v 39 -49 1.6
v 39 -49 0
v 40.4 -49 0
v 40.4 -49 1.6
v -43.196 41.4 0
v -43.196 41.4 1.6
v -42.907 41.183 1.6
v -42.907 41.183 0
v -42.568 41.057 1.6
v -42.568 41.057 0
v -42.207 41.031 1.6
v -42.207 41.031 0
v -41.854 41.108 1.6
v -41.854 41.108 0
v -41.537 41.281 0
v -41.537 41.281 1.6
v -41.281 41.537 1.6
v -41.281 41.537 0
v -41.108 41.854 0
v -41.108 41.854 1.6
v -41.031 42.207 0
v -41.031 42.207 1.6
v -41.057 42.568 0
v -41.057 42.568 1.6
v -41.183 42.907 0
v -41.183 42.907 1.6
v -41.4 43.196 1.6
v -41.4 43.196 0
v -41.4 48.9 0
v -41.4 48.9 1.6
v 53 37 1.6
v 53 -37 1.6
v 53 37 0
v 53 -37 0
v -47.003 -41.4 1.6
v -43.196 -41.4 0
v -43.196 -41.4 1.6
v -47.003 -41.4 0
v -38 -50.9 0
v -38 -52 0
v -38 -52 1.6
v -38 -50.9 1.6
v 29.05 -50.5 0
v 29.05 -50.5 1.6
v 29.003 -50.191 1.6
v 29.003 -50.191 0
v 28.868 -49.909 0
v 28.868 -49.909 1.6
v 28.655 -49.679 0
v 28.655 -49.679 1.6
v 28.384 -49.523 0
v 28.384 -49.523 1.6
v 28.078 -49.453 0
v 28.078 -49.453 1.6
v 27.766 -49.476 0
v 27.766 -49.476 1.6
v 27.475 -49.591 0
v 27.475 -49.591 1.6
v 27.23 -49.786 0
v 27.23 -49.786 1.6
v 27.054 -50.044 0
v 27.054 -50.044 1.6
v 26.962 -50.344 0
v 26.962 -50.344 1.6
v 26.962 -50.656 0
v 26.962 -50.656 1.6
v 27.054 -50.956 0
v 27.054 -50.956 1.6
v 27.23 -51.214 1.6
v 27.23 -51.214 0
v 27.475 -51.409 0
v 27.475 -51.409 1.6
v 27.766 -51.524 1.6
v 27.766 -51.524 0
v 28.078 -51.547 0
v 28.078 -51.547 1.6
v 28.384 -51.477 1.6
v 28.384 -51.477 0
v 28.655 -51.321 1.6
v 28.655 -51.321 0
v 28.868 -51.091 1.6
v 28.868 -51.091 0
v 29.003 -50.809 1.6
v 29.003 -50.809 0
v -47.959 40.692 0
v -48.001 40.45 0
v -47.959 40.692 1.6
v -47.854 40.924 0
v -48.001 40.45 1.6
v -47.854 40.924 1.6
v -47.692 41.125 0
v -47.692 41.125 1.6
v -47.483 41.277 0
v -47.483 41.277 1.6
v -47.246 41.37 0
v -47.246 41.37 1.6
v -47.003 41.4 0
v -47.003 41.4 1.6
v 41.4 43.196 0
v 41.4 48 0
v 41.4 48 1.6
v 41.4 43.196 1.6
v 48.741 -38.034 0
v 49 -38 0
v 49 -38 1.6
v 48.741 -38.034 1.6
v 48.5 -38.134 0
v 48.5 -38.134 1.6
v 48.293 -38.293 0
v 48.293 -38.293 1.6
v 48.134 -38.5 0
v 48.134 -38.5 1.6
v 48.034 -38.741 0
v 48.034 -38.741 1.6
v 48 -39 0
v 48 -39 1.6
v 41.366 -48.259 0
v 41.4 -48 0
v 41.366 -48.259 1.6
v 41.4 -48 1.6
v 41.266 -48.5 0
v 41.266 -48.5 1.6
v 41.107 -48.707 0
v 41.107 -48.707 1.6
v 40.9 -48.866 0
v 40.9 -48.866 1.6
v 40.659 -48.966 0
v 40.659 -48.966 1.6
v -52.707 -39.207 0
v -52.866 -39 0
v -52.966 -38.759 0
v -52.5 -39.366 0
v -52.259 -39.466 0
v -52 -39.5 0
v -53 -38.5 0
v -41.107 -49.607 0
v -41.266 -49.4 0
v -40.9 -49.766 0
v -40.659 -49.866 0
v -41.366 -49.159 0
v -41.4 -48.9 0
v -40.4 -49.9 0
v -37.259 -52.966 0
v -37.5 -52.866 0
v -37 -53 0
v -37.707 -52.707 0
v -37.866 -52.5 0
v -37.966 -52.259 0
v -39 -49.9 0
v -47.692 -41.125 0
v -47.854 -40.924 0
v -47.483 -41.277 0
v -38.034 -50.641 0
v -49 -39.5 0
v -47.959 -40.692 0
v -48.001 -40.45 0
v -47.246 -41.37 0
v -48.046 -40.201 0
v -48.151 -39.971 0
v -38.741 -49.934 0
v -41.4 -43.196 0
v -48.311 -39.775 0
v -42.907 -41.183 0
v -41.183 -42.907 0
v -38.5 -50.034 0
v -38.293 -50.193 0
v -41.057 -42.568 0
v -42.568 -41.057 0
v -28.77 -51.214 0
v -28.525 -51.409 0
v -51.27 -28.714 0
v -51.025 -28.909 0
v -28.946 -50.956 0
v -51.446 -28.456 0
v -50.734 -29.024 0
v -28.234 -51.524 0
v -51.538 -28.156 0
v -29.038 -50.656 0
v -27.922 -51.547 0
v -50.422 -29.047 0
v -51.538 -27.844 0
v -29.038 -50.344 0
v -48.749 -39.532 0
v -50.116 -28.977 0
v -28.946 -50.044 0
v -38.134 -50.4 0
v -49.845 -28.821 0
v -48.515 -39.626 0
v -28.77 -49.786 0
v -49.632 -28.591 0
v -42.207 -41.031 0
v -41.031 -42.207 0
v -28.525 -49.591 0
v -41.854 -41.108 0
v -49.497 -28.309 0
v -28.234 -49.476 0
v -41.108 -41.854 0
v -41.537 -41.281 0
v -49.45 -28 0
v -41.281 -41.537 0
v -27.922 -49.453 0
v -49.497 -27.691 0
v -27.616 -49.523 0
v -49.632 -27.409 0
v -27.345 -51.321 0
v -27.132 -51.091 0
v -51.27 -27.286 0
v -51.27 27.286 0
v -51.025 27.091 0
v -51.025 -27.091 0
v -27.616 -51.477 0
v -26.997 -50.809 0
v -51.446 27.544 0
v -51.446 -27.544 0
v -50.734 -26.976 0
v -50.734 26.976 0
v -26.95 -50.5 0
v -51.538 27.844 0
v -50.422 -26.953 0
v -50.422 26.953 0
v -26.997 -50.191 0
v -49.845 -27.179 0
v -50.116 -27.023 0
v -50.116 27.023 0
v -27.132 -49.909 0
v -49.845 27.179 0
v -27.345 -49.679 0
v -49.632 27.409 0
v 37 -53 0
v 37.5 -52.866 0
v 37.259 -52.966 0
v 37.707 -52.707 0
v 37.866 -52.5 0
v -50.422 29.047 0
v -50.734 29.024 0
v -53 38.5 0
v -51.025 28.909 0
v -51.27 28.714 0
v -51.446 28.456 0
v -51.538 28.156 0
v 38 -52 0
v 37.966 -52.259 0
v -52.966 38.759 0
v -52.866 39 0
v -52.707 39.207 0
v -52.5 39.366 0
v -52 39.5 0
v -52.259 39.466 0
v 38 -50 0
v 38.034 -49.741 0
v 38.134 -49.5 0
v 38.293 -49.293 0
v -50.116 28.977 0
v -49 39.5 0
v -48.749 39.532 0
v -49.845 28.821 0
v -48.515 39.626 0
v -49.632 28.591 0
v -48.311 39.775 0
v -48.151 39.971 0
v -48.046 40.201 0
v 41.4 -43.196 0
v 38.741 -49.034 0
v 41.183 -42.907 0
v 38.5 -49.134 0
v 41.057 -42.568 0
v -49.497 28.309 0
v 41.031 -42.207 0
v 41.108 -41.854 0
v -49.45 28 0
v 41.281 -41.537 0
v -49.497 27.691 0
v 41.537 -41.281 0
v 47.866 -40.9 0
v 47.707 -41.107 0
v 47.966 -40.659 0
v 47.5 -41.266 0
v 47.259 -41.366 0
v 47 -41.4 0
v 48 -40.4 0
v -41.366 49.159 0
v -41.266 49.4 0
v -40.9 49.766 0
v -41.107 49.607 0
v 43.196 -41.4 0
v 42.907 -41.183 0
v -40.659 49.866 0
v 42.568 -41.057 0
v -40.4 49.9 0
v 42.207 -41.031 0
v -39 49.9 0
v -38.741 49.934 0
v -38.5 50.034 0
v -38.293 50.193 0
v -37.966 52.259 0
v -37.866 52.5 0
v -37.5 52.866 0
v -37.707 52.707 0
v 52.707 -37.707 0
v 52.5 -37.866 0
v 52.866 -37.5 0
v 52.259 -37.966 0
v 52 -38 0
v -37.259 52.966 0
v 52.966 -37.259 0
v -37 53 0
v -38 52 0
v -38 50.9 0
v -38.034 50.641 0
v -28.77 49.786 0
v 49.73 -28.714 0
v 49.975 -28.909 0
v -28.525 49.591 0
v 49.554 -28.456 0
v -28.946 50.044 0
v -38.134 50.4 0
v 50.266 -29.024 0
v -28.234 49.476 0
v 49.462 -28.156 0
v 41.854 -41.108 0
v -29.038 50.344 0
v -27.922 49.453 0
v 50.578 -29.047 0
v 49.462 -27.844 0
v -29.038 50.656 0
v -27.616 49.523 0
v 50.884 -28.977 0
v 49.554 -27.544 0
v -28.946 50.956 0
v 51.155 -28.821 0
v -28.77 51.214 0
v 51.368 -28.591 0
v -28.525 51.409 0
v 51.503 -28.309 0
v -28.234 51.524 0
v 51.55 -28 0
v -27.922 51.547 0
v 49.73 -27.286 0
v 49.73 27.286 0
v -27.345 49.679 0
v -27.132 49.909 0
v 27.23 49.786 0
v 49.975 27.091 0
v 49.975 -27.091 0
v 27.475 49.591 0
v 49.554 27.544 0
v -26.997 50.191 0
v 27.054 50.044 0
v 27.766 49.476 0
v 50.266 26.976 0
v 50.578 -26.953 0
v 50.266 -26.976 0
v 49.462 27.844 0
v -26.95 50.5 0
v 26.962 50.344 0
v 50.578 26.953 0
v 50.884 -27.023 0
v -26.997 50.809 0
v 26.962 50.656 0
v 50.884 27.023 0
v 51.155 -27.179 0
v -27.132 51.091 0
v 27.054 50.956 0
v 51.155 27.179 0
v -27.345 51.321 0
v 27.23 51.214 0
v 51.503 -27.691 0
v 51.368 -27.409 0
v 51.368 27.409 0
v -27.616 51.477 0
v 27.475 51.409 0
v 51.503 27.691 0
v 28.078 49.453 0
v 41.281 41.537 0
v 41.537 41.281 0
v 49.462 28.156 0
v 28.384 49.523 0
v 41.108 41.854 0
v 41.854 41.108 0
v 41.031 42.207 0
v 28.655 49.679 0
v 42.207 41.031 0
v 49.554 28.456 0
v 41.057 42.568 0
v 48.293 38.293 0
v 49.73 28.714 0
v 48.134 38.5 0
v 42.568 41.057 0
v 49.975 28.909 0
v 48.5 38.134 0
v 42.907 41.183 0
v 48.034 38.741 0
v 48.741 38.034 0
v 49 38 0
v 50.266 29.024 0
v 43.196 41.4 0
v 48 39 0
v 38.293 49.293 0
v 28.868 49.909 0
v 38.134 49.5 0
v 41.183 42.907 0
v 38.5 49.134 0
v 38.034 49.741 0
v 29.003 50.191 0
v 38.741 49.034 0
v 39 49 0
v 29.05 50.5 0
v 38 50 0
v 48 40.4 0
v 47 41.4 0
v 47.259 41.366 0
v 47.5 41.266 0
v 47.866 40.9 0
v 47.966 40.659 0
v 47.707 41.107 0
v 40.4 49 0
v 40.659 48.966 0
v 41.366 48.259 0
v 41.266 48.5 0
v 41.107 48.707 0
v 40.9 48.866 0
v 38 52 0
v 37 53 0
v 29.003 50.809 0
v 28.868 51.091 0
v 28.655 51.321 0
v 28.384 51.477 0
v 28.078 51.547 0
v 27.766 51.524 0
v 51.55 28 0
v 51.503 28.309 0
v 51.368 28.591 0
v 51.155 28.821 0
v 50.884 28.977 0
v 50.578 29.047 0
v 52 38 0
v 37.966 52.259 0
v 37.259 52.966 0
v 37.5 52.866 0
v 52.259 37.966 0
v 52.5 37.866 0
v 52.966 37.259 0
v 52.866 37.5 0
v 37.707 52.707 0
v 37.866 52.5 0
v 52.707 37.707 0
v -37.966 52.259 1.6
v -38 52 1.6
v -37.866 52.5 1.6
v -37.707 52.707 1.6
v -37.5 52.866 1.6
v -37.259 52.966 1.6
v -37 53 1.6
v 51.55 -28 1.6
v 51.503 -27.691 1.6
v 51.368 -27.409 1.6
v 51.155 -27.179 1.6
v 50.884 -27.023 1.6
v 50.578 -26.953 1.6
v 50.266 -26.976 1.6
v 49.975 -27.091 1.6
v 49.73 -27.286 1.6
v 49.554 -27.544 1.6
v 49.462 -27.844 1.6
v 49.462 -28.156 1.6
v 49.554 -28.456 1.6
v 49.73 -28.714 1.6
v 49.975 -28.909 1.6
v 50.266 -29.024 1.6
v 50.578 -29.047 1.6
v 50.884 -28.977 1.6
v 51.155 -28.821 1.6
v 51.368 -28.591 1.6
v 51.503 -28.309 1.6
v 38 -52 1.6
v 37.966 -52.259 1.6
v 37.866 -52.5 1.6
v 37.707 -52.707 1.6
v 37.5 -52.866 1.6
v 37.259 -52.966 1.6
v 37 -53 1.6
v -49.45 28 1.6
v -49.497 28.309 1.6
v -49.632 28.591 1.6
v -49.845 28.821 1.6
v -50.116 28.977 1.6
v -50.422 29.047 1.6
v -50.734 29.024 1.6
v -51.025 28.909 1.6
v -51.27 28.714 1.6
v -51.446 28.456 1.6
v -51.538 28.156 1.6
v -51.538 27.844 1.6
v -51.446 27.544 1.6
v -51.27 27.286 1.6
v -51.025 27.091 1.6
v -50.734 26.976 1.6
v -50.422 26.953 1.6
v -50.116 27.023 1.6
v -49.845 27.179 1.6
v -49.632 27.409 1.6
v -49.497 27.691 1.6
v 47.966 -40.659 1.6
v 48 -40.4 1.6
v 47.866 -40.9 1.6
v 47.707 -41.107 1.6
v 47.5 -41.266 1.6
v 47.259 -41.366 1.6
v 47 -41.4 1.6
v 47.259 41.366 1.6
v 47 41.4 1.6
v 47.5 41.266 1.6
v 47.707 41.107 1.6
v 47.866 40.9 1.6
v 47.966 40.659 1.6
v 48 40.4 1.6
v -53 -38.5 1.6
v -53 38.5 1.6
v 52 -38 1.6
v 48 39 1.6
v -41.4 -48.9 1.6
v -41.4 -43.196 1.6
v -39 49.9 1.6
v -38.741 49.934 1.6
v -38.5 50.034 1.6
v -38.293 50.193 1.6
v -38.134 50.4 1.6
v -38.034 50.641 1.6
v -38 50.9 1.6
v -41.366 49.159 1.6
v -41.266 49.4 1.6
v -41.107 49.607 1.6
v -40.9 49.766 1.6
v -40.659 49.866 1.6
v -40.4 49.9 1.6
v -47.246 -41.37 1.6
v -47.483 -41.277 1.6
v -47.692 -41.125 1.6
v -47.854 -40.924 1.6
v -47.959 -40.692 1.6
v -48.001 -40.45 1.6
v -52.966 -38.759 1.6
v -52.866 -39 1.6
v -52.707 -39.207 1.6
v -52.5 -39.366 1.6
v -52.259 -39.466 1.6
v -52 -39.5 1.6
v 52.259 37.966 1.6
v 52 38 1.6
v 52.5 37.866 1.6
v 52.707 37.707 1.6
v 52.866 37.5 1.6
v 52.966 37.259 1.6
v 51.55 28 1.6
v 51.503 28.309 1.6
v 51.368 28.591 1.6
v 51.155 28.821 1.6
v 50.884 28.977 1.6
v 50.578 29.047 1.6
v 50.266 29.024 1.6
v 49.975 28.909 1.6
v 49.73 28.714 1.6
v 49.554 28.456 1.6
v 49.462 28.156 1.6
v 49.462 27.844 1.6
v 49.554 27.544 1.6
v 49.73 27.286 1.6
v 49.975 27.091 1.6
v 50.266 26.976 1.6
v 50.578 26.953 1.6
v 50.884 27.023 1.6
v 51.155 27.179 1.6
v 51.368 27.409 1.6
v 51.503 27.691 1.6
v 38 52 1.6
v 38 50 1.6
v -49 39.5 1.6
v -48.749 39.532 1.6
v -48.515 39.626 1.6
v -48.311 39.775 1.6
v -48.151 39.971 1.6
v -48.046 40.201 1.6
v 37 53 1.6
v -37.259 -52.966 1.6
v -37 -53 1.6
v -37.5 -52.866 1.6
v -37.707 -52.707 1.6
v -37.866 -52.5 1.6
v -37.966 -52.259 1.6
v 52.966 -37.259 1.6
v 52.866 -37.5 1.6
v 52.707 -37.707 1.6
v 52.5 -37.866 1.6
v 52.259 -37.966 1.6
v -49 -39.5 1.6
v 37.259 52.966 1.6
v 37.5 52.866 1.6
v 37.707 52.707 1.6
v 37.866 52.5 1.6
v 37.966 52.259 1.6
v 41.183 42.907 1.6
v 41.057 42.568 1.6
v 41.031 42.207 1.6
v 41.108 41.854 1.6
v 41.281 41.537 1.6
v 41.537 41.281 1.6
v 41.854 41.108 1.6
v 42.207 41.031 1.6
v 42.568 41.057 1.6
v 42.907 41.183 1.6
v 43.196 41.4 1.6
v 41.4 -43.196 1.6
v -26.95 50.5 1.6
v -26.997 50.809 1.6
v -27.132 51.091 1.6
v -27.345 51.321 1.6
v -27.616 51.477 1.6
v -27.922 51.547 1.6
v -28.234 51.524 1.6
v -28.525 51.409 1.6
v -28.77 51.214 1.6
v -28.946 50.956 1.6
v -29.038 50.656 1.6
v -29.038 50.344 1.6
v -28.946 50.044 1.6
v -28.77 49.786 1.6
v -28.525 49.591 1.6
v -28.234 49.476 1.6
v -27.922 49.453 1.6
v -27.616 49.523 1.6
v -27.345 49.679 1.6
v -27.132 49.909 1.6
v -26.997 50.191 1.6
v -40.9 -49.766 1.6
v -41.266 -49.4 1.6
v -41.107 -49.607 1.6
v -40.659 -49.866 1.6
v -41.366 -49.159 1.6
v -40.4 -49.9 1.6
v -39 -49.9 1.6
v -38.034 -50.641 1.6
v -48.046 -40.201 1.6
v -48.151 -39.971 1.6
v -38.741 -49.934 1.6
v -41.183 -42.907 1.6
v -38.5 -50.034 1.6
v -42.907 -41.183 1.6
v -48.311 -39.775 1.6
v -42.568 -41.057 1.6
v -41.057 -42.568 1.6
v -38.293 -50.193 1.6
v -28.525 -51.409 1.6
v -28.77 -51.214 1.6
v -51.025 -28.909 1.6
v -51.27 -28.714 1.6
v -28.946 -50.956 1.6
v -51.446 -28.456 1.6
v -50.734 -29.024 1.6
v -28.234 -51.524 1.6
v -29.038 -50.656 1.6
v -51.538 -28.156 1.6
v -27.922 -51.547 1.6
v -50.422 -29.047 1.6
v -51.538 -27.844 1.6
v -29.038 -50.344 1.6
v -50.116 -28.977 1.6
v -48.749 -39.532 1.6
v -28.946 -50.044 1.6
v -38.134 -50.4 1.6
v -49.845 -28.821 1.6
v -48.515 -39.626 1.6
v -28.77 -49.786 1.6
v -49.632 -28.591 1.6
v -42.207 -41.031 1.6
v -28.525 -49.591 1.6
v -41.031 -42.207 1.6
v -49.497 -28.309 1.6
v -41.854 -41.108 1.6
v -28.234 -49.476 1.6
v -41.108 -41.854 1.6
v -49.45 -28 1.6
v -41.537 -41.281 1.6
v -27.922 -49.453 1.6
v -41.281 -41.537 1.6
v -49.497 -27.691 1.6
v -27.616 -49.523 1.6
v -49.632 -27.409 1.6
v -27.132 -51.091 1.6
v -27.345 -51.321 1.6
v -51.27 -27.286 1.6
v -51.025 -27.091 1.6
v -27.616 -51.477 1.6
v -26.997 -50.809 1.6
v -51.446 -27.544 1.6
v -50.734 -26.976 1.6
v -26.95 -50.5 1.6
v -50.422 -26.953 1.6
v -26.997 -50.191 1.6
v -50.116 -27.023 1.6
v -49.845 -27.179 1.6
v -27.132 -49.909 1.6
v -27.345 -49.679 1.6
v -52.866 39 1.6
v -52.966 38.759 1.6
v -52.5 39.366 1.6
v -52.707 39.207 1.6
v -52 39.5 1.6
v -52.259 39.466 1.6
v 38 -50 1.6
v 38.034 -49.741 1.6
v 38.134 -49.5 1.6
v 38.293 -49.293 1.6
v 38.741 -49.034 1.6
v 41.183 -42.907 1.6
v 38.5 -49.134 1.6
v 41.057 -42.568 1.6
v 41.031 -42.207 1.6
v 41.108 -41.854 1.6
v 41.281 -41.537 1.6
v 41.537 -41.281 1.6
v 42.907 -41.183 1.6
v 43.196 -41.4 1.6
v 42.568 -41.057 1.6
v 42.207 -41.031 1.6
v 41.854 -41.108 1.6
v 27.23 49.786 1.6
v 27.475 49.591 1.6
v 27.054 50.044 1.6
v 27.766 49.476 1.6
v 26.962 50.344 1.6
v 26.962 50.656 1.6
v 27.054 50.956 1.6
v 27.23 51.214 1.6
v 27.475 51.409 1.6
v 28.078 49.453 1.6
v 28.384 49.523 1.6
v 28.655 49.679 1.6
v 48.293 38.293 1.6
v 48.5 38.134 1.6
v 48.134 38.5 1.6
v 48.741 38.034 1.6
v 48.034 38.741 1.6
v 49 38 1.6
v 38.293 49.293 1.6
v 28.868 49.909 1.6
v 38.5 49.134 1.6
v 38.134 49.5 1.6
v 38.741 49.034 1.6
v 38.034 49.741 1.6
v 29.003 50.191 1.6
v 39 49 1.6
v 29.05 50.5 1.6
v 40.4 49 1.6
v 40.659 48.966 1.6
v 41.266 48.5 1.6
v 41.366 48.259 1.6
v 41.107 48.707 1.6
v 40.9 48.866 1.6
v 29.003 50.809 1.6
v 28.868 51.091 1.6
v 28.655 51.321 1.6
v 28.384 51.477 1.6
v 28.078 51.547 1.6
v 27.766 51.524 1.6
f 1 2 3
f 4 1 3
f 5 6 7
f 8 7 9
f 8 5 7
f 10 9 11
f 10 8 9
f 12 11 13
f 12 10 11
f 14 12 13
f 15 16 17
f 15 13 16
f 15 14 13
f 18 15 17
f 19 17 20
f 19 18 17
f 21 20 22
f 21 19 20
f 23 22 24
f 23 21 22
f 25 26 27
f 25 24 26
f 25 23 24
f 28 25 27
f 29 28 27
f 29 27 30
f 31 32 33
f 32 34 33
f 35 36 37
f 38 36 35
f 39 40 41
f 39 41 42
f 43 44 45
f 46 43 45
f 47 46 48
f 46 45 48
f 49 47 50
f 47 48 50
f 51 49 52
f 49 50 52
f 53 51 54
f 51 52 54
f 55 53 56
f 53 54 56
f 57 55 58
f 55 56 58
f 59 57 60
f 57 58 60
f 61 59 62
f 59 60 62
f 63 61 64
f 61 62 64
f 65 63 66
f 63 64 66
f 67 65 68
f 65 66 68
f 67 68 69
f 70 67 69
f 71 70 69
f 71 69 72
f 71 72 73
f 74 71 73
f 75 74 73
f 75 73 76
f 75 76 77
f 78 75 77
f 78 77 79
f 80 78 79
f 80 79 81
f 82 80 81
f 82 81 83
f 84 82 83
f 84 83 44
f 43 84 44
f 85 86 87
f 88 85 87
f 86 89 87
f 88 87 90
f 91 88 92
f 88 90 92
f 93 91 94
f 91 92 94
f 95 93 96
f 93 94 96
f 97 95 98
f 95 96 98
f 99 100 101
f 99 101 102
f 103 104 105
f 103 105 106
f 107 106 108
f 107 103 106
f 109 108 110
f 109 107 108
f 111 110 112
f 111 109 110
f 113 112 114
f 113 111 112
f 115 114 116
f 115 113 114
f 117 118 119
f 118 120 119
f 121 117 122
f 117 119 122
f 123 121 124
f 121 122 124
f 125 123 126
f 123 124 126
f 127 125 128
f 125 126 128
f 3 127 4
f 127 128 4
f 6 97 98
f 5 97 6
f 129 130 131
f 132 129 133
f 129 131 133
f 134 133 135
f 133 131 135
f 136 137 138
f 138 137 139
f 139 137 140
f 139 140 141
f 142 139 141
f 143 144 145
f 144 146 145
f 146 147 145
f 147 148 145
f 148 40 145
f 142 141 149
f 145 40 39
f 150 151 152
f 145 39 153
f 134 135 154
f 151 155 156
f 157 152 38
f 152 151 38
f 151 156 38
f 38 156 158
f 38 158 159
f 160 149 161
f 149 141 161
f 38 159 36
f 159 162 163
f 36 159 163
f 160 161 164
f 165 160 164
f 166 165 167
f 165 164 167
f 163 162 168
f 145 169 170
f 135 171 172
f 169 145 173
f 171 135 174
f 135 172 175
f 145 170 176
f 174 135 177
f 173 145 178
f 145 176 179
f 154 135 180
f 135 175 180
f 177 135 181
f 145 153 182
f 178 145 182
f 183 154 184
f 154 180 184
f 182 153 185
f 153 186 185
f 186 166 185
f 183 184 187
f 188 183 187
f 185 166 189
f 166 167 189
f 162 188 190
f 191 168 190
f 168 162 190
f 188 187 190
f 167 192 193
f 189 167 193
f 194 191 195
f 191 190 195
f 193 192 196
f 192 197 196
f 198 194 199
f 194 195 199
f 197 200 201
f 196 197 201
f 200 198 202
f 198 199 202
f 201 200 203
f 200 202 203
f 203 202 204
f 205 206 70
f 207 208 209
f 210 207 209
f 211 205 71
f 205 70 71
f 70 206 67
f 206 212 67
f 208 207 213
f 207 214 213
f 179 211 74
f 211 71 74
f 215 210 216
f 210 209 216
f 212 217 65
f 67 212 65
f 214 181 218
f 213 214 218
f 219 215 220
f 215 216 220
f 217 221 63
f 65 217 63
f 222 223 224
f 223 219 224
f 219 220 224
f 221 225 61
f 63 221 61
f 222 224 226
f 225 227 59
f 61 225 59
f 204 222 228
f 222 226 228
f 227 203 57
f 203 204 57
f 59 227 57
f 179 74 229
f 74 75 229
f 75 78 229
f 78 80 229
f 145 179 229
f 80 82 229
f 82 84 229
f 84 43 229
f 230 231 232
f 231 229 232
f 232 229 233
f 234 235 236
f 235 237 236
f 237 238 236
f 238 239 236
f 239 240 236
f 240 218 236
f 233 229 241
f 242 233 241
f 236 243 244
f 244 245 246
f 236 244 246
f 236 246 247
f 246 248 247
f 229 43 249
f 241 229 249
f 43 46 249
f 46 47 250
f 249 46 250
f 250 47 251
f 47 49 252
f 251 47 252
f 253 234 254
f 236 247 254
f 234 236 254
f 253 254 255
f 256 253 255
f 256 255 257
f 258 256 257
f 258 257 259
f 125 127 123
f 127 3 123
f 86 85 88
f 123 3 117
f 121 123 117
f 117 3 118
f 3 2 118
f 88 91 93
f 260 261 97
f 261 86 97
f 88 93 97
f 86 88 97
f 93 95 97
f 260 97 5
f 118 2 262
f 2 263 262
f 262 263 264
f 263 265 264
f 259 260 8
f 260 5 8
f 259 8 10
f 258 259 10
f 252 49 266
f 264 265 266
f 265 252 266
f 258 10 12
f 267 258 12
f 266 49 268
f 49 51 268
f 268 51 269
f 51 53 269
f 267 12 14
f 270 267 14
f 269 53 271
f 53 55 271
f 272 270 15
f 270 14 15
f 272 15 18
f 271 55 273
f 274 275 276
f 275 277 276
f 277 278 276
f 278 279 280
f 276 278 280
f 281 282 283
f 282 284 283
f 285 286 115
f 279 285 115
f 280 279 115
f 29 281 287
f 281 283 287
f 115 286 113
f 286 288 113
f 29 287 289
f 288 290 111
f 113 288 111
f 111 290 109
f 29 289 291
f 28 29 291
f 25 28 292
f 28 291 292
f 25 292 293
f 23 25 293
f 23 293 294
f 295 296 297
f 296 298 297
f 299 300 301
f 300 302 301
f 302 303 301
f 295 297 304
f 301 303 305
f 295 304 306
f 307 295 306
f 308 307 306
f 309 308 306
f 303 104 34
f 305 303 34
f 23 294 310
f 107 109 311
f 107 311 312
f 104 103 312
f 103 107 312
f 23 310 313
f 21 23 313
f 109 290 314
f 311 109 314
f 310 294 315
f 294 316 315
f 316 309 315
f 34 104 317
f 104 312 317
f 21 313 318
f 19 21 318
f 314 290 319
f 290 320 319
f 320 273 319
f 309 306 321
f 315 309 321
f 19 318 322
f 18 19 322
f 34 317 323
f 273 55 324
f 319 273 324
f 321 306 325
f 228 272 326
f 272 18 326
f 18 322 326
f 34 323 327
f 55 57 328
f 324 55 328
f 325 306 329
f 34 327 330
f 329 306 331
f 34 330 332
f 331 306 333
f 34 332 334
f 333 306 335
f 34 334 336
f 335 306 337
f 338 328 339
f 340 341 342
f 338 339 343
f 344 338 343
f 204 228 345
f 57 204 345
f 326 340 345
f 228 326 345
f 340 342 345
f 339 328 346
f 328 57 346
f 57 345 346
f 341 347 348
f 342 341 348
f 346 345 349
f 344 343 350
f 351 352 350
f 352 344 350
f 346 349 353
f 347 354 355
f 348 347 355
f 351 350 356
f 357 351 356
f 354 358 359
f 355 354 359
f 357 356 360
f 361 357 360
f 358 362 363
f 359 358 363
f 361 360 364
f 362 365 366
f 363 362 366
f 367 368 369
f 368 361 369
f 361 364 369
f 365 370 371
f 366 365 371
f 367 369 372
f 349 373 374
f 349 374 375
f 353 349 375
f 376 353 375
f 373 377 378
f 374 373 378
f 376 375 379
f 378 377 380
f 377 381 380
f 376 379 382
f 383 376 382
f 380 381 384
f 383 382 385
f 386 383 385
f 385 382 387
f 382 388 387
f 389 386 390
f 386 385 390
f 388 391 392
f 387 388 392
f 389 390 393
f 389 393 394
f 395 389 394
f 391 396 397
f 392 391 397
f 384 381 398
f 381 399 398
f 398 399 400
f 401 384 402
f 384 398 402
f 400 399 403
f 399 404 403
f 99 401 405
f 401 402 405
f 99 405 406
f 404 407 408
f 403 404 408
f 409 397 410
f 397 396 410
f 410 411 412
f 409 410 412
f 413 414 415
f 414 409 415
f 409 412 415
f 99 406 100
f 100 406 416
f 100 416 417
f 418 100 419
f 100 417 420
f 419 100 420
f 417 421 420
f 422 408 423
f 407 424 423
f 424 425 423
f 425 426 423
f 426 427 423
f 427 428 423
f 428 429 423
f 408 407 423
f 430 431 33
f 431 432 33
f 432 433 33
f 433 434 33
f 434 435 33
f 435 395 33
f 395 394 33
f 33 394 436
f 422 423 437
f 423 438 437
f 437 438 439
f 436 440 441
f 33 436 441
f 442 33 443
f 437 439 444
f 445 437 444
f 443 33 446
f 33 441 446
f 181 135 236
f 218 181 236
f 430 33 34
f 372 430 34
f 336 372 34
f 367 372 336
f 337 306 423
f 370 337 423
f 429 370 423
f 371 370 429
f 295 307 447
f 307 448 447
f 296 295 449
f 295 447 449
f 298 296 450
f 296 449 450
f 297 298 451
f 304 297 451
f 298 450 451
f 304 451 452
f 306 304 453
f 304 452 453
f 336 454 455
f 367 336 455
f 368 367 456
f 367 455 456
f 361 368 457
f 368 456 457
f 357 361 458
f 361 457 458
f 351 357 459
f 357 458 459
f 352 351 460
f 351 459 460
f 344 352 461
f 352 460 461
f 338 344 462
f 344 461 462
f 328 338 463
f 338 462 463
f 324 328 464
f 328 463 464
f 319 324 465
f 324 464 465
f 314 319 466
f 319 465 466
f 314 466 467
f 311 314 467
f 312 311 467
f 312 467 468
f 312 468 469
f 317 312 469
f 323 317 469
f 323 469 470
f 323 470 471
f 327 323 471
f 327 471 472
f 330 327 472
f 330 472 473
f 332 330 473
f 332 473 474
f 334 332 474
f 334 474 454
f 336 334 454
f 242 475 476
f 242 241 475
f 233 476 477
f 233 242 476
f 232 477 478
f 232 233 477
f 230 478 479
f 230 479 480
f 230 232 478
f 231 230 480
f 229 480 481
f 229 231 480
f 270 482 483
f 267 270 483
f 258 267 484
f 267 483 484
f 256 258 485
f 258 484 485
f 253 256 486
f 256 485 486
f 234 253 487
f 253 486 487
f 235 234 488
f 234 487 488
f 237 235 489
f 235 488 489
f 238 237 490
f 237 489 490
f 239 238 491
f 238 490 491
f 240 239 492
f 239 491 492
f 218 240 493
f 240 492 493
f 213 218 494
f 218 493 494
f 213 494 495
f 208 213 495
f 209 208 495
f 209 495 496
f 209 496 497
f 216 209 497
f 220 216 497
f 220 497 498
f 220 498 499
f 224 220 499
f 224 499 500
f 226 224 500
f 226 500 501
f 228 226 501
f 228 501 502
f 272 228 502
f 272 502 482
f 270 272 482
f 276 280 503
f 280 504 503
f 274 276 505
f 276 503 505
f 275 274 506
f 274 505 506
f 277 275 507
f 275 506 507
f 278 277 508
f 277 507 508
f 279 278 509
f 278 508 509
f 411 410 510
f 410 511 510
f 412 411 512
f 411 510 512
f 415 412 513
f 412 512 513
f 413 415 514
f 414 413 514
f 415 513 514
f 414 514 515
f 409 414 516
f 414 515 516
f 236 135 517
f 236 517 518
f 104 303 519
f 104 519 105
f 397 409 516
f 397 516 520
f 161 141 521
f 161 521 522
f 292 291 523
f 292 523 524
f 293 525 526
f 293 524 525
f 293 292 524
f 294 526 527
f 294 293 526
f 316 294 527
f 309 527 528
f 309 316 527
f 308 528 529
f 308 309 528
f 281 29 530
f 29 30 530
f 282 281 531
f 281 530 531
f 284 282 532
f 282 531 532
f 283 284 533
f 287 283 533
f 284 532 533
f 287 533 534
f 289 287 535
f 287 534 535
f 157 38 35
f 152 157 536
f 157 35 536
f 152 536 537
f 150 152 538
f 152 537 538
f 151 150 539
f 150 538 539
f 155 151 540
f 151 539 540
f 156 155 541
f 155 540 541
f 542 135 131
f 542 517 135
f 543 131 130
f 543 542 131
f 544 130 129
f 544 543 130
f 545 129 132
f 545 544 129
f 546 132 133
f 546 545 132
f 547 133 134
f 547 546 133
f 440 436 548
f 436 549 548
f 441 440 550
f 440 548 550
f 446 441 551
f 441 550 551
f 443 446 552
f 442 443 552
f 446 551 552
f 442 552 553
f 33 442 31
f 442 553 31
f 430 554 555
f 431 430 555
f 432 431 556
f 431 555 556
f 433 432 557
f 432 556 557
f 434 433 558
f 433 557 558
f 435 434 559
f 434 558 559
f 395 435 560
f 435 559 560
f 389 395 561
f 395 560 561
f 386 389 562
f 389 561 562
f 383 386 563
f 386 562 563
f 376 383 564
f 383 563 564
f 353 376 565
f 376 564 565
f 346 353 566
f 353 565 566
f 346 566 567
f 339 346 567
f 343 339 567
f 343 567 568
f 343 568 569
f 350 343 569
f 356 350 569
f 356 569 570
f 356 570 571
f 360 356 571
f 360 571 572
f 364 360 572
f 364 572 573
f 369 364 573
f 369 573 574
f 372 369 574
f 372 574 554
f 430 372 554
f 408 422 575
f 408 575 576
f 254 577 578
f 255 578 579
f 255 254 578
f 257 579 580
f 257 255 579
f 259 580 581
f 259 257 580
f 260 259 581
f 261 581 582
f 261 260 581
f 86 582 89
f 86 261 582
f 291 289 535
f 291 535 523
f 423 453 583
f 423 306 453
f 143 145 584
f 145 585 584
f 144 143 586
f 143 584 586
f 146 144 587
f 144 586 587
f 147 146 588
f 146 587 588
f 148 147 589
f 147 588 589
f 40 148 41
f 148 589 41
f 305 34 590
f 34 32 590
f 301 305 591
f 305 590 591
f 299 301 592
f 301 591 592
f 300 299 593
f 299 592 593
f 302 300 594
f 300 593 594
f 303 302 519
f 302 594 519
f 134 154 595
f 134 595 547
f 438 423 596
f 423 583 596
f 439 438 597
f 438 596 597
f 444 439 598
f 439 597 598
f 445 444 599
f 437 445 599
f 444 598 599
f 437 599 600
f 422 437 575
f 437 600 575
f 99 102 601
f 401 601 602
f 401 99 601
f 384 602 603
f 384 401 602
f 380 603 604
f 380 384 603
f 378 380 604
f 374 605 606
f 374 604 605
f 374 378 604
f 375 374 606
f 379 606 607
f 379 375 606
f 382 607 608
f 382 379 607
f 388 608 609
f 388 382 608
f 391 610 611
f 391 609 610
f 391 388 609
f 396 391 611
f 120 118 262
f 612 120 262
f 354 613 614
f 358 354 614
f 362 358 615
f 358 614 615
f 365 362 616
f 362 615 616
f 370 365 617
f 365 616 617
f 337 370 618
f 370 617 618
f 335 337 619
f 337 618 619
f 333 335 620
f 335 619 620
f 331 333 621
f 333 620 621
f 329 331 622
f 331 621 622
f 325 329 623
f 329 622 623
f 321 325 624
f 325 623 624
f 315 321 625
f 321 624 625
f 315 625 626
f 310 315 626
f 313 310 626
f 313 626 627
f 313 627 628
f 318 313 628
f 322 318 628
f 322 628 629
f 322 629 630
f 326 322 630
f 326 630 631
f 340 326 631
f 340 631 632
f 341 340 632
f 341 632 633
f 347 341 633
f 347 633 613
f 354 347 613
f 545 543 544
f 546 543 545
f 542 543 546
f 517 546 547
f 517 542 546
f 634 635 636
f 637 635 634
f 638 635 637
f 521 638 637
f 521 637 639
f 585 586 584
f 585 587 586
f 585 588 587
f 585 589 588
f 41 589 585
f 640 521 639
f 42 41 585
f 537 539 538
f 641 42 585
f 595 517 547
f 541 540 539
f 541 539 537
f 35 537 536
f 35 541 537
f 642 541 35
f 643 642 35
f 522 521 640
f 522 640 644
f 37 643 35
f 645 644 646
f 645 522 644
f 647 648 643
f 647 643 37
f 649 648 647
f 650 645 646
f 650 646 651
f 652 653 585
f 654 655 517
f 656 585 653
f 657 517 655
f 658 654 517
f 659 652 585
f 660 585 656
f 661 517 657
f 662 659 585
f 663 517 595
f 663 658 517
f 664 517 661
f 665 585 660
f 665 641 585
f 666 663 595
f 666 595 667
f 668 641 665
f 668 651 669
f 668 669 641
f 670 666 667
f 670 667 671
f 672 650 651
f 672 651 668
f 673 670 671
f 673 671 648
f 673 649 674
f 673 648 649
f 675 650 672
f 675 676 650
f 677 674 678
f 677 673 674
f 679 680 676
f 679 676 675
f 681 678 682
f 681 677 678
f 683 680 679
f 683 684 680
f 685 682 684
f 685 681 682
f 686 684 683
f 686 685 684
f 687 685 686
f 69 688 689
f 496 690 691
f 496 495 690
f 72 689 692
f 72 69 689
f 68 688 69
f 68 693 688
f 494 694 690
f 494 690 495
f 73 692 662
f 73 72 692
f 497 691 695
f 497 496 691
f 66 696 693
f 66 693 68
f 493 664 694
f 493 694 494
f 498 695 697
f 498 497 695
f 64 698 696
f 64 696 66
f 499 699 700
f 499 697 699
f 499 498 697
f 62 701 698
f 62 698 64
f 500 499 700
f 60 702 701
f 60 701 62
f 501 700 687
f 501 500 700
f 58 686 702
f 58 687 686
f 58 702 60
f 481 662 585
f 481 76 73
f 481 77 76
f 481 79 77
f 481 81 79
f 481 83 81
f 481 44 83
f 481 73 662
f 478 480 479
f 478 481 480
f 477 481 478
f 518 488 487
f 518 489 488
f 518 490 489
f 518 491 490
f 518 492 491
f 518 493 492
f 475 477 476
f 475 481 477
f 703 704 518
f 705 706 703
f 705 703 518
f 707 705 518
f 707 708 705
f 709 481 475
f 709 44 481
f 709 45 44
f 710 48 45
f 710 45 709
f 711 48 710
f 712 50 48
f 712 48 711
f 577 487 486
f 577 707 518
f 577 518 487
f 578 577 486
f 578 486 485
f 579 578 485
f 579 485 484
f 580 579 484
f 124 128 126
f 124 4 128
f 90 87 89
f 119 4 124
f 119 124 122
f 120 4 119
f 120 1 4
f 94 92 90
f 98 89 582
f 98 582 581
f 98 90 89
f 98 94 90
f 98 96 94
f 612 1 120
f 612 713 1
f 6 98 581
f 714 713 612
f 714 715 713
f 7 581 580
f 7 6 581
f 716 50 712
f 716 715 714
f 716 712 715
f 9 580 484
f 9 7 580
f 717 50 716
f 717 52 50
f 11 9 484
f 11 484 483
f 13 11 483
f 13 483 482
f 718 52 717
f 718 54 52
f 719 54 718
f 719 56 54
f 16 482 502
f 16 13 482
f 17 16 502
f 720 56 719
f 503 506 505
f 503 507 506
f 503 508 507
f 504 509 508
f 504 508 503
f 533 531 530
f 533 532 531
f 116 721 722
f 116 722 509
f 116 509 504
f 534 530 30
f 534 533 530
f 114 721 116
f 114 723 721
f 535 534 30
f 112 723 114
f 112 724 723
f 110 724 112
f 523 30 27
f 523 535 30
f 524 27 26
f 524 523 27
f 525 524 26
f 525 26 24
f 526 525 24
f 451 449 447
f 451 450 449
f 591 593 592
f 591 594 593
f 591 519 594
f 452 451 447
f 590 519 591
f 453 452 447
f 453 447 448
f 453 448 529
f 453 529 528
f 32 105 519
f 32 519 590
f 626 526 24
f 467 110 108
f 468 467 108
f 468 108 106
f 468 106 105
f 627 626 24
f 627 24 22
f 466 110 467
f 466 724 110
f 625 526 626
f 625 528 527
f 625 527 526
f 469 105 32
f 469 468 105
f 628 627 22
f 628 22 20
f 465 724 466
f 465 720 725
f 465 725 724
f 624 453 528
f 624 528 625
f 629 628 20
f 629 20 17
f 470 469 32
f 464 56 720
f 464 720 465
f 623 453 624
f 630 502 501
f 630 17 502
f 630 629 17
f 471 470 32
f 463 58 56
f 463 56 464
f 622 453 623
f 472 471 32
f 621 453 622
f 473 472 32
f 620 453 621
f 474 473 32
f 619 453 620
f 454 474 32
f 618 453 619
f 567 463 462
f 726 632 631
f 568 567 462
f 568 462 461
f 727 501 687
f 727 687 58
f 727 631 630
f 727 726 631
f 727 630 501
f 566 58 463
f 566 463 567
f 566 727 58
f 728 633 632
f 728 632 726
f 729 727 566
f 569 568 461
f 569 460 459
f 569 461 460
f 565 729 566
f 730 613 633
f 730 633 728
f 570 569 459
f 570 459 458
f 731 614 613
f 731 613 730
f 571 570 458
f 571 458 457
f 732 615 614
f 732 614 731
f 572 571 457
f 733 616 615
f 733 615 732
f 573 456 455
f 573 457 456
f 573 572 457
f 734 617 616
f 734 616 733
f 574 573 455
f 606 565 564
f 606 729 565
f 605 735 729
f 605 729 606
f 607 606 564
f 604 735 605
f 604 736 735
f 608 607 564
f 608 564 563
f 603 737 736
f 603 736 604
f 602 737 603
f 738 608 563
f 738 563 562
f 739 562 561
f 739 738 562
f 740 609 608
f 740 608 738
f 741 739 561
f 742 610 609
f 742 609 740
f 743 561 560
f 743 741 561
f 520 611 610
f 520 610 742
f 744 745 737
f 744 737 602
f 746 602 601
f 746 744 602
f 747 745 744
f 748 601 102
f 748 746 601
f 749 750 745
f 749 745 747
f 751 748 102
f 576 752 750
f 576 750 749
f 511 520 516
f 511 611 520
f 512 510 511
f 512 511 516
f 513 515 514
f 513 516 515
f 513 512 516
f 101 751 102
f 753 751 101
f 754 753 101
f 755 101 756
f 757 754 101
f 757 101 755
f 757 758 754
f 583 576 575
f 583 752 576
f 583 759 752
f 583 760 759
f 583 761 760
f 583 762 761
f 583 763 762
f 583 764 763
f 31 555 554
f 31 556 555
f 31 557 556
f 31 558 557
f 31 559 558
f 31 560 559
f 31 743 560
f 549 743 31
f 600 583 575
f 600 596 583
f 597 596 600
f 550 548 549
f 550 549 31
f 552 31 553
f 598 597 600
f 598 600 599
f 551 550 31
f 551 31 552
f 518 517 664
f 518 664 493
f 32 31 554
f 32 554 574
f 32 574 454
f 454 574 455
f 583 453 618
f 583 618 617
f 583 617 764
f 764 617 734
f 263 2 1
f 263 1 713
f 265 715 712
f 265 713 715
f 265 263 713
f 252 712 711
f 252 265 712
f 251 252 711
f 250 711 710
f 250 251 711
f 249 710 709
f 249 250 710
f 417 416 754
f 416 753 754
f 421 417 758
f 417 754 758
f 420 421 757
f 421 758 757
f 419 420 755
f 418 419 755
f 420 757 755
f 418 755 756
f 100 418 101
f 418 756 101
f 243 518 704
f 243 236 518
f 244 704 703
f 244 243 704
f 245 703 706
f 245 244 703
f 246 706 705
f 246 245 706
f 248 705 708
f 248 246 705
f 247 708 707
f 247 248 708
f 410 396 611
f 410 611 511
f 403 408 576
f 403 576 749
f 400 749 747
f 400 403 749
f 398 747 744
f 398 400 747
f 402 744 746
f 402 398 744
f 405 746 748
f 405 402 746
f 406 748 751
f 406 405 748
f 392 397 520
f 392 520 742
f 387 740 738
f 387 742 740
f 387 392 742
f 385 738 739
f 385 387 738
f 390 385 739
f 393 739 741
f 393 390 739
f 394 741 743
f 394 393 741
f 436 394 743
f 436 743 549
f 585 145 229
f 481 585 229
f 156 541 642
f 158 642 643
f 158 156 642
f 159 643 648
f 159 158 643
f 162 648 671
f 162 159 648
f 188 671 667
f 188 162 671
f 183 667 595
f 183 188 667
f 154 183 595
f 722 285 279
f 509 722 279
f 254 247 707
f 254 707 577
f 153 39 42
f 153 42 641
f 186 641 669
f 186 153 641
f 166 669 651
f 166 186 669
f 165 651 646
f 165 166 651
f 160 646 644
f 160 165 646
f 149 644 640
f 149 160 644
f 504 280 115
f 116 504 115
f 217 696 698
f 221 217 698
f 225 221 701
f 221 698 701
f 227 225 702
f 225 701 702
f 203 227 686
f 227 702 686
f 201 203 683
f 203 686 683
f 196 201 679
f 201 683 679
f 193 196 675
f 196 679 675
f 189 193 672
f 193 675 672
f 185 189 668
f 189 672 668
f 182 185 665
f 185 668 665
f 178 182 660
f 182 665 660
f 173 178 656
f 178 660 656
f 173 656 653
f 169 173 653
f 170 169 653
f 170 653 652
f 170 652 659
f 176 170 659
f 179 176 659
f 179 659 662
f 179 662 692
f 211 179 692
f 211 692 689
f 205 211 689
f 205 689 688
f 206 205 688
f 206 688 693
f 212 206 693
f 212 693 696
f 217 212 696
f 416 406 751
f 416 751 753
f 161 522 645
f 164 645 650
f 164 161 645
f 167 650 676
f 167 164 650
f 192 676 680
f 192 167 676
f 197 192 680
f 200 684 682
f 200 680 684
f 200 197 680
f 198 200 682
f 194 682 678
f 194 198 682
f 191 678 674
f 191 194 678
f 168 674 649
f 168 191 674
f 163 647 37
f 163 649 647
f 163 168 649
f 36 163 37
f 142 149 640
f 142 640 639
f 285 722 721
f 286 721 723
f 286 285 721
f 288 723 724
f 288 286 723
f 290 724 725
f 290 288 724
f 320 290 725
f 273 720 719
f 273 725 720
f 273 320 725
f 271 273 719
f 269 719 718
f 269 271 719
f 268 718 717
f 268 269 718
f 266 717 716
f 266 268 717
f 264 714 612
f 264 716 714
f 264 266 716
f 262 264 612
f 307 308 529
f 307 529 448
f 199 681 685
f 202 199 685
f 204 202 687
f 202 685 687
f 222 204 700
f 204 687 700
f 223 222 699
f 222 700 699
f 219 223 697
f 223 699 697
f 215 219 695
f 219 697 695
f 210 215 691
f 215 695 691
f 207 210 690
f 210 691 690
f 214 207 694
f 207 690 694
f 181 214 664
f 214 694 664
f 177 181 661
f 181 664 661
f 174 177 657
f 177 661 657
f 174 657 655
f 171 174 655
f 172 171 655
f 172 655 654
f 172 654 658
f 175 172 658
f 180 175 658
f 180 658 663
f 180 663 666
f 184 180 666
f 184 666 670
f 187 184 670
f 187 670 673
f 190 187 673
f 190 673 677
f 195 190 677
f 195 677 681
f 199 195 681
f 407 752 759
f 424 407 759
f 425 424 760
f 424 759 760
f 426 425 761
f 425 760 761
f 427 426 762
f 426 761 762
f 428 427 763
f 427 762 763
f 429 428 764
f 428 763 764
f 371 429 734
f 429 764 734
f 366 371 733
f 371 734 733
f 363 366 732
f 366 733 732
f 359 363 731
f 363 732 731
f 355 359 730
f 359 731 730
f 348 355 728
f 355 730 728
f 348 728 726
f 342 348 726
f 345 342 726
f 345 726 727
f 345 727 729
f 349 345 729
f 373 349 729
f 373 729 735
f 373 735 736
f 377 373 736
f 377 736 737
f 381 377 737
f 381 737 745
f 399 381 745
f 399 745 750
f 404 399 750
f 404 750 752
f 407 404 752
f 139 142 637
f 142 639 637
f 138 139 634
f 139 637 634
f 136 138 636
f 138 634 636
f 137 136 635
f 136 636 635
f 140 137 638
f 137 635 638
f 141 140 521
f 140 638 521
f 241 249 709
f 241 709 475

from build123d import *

# Parameters (mm, degrees)
SKETCH1_W            = 106
SKETCH1_H            = 106
MAINOUTLINE_DEPTH    = 1.6
RAILCUTOUTS_DEPTH    = 75.970394157
DOGBONES_DEPTH       = 75.970394157
SOLARFILLETS_DEPTH   = 75.970394157
HANDLINGFILLETS_R    = 1
M2_CLEARANCE_HOLE1_D = 2.1


with BuildPart() as part:
    # Sketch1 → mainOutline (new body)
    with BuildSketch(Plane.XY):
        Rectangle(SKETCH1_W, SKETCH1_H)
    extrude(amount=MAINOUTLINE_DEPTH)

    # Sketch4 → railCutouts (cut, through all)
    with BuildSketch(Plane(origin=(0, 0, 0), x_dir=(-1, 0, 0), z_dir=(0, 0, -1))):
        Polygon((-41.4, -41.4), (-48, -41.4), (-48, -39), (-49.9975, -39), (-60.106513243, -39), (-60.106513243, -61.452099286), (-39, -61.452099286), (-39, -49.9), (-39, -49), (-41.4, -49), align=None)
        Polygon((39, -56.27525328), (39, -49.9), (41.4, -49.9), (41.4, -41.4), (48, -41.4), (48, -40.5), (55.517672261, -40.5), (55.517672261, -56.27525328), align=None)
        Polygon((55.383846757, 40.5), (48, 40.5), (48, 41.4), (41.4, 41.4), (41.4, 49.9), (39, 49.9), (39, 57.687687567), (55.383846757, 57.687687567), align=None)
        Polygon((-39, 59.880423019), (-39, 49.9), (-39, 49), (-41.4, 49), (-41.4, 41.4), (-48, 41.4), (-48, 39), (-49.9975, 39), (-56.842822937, 39), (-56.842822937, 59.880423019), align=None)
    extrude(amount=-RAILCUTOUTS_DEPTH, mode=Mode.SUBTRACT)

    # Sketch5 → dogbones (cut, through all)
    with BuildSketch(Plane(origin=(0, 0, 0), x_dir=(-1, 0, 0), z_dir=(0, 0, -1))):
        with BuildLine():
            Line((-41.4, -43.196051224), (-44.546497129, -46.342548353))
            ThreePointArc((-44.546497129, -46.342548353), (-46.342548353, -46.342548353), (-46.342548353, -44.546497129))
            Line((-46.342548353, -44.546497129), (-43.196051224, -41.4))
            ThreePointArc((-43.196051224, -41.4), (-41.4, -41.4), (-41.4, -43.196051224))
        make_face()
        with BuildLine():
            Line((43.196051224, -41.4), (44.93821772, -43.142166495))
            ThreePointArc((44.93821772, -43.142166495), (44.93821772, -44.93821772), (43.142166495, -44.93821772))
            Line((43.142166495, -44.93821772), (41.4, -43.196051224))
            ThreePointArc((41.4, -43.196051224), (41.4, -41.4), (43.196051224, -41.4))
        make_face()
        with BuildLine():
            Line((41.4, 43.196051224), (43.13099025, 44.927041474))
            ThreePointArc((43.13099025, 44.927041474), (44.927041474, 44.927041474), (44.927041474, 43.13099025))
            Line((44.927041474, 43.13099025), (43.196051224, 41.4))
            ThreePointArc((43.196051224, 41.4), (41.4, 41.4), (41.4, 43.196051224))
        make_face()
        with BuildLine():
            Line((-43.196051224, 41.4), (-44.694846249, 42.898795025))
            ThreePointArc((-44.694846249, 42.898795025), (-44.694846249, 44.694846249), (-42.898795025, 44.694846249))
            Line((-42.898795025, 44.694846249), (-41.4, 43.196051224))
            ThreePointArc((-41.4, 43.196051224), (-41.4, 41.4), (-43.196051224, 41.4))
        make_face()
    extrude(amount=-DOGBONES_DEPTH, mode=Mode.SUBTRACT)

    # Sketch6 → solarFillets (cut, through all)
    with BuildSketch(Plane(origin=(0, 0, 0), x_dir=(-1, 0, 0), z_dir=(0, 0, -1))):
        with BuildLine():
            Line((-40, 50), (-40, 53))
            ThreePointArc((-40, 53), (-39, 54), (-38, 53))
            Line((-38, 53), (-38, 50))
            ThreePointArc((-38, 50), (-39, 49), (-40, 50))
        make_face()
        with BuildLine():
            Line((-49, 38), (-53, 38))
            ThreePointArc((-53, 38), (-54, 39), (-53, 40))
            Line((-53, 40), (-49, 40))
            ThreePointArc((-49, 40), (-48, 39), (-49, 38))
        make_face()
        with BuildLine():
            Line((-49, -40), (-55.214202913, -40))
            ThreePointArc((-55.214202913, -40), (-56.214202913, -39), (-55.214202913, -38))
            Line((-55.214202913, -38), (-49, -38))
            ThreePointArc((-49, -38), (-48, -39), (-49, -40))
        make_face()
        with BuildLine():
            Line((-38, -50), (-38, -53.916094318))
            ThreePointArc((-38, -53.916094318), (-39, -54.916094318), (-40, -53.916094318))
            Line((-40, -53.916094318), (-40, -50))
            ThreePointArc((-40, -50), (-39, -49), (-38, -50))
        make_face()
        with BuildLine():
            Line((40, -50.9), (40, -54.538013421))
            ThreePointArc((40, -54.538013421), (39, -55.538013421), (38, -54.538013421))
            Line((38, -54.538013421), (38, -50.9))
            ThreePointArc((38, -50.9), (39, -49.9), (40, -50.9))
        make_face()
        with BuildLine():
            Line((49, -39.5), (54.202622605, -39.5))
            ThreePointArc((54.202622605, -39.5), (55.202622605, -40.5), (54.202622605, -41.5))
            Line((54.202622605, -41.5), (49, -41.5))
            ThreePointArc((49, -41.5), (48, -40.5), (49, -39.5))
        make_face()
        with BuildLine():
            Line((49, 41.5), (54.556563772, 41.5))
            ThreePointArc((54.556563772, 41.5), (55.556563772, 40.5), (54.556563772, 39.5))
            Line((54.556563772, 39.5), (49, 39.5))
            ThreePointArc((49, 39.5), (48, 40.5), (49, 41.5))
        make_face()
        with BuildLine():
            Line((38, 50.9), (38, 55.828092709))
            ThreePointArc((38, 55.828092709), (39, 56.828092709), (40, 55.828092709))
            Line((40, 55.828092709), (40, 50.9))
            ThreePointArc((40, 50.9), (39, 49.9), (38, 50.9))
        make_face()
    extrude(amount=-SOLARFILLETS_DEPTH, mode=Mode.SUBTRACT)

    # handlingFillets
    handlingfillets_edges = [part.edges().sort_by_distance(p)[0] for p in [
        (-41.4, -49.9, 0.8),
        (-38, -53, 0.8),
        (-53, -39.5, 0.8),
        (-48, -41.4, 0.8),
        (-48, 41.4, 0.8),
        (-53, 39.5, 0.8),
        (-41.4, 49.9, 0.8),
        (-38, 53, 0.8),
        (38, 53, 0.8),
        (41.4, 49, 0.8),
        (48, 41.4, 0.8),
        (53, 38, 0.8),
        (53, -38, 0.8),
        (48, -41.4, 0.8),
        (41.4, -49, 0.8),
        (38, -53, 0.8),
    ]]
    fillet(handlingfillets_edges, radius=HANDLINGFILLETS_R)

    # M2 Clearance Hole1 (through all)
    with Locations(Plane(origin=(0, 0, 0), x_dir=(-1, 0, 0), z_dir=(0, 0, -1))):
        with Locations((50.5, -28), (28, -50.5), (-50.5, -28), (-28, -50.5), (-28, 50.5), (-50.5, 28), (28, 50.5), (50.5, 28)):
            Hole(M2_CLEARANCE_HOLE1_D / 2)


solid = part.part
